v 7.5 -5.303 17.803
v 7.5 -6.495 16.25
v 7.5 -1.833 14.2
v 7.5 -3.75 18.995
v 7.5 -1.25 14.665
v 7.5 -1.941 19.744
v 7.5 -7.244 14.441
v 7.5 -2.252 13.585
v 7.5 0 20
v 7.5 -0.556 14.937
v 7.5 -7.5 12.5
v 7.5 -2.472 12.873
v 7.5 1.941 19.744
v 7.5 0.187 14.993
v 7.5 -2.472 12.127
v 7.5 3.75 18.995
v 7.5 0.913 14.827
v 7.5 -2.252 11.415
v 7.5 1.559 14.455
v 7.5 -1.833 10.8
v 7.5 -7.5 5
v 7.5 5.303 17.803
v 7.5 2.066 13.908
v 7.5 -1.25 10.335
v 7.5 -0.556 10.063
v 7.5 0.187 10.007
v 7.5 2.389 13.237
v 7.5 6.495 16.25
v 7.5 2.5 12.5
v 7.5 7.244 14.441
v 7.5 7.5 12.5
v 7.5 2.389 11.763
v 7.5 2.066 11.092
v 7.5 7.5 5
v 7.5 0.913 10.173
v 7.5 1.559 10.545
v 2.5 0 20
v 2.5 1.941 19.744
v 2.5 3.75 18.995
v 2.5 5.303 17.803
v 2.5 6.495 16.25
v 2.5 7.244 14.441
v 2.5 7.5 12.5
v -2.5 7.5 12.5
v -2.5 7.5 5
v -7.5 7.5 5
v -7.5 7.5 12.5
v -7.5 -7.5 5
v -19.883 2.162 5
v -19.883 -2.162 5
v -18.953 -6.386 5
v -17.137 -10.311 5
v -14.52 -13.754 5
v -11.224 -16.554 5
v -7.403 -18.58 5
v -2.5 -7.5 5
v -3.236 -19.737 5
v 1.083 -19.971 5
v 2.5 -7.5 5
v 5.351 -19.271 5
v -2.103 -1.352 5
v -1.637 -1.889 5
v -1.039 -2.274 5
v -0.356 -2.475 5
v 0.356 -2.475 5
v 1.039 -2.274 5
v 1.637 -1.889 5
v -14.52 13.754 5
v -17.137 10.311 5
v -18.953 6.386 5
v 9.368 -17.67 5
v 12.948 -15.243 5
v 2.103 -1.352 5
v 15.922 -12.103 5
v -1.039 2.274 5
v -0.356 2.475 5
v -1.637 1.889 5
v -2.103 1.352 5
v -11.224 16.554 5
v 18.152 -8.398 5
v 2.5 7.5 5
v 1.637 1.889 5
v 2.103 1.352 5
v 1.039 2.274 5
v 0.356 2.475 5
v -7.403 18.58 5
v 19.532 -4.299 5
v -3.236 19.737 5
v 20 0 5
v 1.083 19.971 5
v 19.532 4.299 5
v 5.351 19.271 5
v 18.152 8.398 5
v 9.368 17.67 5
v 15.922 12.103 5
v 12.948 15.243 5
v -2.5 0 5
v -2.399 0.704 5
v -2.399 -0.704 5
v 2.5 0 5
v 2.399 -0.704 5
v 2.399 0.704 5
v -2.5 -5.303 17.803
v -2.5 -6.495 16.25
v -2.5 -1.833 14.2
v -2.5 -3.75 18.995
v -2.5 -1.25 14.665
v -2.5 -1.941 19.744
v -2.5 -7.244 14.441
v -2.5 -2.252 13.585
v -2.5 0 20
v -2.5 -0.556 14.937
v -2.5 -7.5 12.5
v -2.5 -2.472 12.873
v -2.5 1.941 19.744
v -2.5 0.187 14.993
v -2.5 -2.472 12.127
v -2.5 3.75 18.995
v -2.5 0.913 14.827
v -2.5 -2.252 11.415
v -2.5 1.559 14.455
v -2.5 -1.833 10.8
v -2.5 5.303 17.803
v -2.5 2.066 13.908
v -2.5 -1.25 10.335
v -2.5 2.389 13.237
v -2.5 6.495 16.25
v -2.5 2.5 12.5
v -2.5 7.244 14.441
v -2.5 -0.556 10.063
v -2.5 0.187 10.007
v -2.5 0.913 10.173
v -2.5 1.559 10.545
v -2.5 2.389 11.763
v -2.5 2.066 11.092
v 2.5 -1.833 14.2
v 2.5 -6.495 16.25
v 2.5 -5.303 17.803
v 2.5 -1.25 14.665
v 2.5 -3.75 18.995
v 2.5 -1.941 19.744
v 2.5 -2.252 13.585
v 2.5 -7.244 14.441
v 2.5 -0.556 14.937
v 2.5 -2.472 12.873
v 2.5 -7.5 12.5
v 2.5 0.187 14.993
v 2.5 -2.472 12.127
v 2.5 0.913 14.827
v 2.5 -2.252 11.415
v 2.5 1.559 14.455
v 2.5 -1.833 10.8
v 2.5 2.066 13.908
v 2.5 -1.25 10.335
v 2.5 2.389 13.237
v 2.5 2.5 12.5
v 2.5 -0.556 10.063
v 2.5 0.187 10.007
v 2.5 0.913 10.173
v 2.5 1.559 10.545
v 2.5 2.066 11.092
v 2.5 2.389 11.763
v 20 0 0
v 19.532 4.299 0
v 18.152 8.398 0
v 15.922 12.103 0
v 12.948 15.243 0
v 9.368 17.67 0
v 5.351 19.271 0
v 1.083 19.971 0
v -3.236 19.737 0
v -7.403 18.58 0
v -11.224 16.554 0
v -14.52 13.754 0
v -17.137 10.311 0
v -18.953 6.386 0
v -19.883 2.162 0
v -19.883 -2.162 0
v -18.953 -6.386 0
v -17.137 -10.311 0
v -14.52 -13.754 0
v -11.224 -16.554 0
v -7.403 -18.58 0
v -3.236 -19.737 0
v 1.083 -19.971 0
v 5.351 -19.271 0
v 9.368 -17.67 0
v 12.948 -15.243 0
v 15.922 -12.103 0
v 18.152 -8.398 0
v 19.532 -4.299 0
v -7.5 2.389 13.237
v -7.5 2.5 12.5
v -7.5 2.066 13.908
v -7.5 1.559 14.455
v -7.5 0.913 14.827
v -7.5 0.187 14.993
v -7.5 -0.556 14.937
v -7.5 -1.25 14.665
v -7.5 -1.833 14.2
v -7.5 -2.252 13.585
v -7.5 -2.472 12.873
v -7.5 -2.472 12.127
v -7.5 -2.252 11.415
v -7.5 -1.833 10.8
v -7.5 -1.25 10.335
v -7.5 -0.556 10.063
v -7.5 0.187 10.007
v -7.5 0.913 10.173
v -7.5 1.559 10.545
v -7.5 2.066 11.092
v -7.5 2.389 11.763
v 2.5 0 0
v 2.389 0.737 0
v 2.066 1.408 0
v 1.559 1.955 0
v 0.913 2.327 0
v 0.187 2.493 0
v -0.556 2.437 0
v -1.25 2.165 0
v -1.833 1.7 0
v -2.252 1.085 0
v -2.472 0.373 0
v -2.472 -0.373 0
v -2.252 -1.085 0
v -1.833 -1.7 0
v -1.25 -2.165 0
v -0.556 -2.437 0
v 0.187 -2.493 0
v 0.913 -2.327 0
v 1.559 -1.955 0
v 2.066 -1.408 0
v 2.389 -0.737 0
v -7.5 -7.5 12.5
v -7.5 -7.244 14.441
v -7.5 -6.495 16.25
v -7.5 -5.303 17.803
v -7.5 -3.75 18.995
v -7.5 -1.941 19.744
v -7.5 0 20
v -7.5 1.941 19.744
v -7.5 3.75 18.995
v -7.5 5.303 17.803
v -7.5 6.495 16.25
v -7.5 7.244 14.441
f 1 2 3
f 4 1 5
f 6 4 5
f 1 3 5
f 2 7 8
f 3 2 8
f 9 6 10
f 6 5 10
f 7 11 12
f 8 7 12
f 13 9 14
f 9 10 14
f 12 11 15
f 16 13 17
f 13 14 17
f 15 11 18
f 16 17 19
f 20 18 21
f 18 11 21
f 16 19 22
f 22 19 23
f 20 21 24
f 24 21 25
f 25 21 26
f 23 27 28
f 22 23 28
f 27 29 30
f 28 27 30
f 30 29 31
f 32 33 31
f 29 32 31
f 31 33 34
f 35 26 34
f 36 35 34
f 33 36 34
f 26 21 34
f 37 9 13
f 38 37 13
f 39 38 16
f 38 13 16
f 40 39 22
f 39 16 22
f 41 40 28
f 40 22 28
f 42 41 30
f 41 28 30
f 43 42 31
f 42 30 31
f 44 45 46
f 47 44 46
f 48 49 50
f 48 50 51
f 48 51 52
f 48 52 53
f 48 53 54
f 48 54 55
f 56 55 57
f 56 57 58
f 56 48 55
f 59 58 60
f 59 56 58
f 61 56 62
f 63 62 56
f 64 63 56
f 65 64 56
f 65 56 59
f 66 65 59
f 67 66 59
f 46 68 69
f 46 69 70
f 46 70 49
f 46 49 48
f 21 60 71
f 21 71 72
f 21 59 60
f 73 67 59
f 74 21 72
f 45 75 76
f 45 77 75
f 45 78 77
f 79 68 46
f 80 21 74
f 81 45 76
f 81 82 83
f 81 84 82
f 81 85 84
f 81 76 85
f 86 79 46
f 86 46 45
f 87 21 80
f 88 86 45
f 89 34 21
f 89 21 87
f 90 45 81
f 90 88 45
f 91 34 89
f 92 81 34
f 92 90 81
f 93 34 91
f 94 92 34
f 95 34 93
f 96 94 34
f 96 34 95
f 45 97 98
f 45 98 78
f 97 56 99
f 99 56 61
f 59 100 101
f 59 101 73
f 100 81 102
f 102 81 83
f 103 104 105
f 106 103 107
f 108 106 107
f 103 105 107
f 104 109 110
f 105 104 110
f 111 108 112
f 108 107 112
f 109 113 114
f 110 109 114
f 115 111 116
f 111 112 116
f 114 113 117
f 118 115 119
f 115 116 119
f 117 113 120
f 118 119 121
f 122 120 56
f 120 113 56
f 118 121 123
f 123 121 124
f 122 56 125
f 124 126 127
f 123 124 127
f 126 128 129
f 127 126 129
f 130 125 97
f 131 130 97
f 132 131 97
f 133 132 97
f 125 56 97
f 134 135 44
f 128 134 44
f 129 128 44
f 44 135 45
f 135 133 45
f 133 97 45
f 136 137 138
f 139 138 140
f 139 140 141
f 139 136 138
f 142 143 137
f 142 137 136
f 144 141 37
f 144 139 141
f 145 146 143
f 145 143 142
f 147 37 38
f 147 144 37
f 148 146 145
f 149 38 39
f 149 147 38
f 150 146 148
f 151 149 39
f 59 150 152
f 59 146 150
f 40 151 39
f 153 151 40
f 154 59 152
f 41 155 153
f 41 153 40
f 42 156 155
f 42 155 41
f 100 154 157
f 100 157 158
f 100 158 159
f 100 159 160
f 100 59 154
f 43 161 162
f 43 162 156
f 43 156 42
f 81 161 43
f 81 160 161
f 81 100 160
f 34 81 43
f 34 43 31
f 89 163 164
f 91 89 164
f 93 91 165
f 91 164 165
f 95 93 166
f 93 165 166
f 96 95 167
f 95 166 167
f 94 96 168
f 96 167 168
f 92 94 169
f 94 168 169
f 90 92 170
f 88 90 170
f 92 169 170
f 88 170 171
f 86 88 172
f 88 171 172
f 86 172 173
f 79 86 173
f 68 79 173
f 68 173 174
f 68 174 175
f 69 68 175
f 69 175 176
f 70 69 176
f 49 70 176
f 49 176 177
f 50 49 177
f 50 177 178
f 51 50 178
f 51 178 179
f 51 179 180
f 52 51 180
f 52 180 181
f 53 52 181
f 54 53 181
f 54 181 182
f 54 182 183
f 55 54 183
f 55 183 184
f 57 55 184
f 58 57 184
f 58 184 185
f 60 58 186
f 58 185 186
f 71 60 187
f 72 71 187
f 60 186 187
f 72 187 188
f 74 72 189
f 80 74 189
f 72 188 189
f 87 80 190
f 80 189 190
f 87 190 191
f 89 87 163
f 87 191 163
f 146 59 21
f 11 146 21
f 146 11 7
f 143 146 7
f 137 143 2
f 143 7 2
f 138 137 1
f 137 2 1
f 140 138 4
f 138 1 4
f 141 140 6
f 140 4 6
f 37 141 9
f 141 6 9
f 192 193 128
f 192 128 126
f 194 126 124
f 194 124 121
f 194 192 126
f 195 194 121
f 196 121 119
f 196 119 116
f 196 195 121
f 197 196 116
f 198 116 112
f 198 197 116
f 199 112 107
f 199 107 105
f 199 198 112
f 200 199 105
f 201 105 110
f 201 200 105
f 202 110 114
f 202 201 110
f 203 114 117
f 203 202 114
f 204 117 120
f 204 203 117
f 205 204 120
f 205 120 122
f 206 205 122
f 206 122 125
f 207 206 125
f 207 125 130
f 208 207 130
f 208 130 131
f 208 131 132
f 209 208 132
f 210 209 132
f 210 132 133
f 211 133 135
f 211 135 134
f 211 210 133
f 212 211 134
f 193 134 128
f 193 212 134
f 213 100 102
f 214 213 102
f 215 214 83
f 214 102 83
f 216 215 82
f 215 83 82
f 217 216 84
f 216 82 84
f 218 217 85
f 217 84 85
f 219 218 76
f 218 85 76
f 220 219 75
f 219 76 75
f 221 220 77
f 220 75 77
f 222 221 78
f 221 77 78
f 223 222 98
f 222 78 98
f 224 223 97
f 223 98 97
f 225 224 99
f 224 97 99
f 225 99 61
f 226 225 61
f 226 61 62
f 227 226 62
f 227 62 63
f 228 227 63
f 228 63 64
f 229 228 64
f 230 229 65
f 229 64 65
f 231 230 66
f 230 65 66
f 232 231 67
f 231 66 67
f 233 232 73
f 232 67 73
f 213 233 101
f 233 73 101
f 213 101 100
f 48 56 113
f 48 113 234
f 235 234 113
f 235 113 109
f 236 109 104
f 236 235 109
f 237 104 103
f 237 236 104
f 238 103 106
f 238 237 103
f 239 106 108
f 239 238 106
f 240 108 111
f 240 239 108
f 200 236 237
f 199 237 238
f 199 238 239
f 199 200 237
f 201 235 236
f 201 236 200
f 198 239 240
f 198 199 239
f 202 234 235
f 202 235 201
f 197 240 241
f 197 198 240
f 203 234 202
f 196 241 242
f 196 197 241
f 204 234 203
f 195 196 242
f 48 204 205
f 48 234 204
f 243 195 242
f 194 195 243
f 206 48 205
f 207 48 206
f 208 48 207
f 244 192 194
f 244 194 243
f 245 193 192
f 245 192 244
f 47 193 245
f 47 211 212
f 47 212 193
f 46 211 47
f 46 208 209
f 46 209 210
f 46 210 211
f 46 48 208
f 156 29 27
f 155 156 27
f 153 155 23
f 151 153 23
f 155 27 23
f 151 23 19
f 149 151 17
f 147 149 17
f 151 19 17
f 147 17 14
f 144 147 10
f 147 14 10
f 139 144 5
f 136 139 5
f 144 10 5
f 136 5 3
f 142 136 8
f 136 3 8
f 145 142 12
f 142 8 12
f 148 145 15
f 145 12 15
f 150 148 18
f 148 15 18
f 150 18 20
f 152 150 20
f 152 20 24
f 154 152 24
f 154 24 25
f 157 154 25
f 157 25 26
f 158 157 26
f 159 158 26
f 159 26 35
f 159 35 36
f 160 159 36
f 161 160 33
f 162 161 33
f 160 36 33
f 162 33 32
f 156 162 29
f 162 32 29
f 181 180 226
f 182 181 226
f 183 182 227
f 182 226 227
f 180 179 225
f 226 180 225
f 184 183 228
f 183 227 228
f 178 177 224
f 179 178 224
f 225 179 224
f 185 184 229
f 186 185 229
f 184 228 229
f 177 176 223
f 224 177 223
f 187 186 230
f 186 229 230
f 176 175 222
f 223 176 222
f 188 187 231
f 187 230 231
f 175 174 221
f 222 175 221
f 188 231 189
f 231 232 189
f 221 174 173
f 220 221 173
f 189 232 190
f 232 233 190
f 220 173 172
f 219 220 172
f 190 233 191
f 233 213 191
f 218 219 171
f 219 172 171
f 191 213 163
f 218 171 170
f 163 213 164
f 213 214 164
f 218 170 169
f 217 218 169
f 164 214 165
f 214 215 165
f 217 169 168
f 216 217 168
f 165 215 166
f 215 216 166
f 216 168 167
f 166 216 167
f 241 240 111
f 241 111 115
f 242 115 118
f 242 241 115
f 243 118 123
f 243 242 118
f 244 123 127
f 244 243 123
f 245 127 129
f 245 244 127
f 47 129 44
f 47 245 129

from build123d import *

# Parameters (mm, degrees)
CROQUIS1_R              = 20
SALIENTE_EXTRUIR1_DEPTH = 5
CROQUIS2_R              = 2.5
CORTAR_EXTRUIR1_DEPTH   = 5
CROQUIS3_W              = 5
CROQUIS3_H              = 15
SALIENTE_EXTRUIR3_DEPTH = 15
CROQUIS4_R              = 2.5
CORTAR_EXTRUIR2_DEPTH   = 5


with BuildPart() as part:
    # Croquis1 → Saliente-Extruir1 (new body)
    with BuildSketch(Plane.XY):
        Circle(CROQUIS1_R)
    extrude(amount=SALIENTE_EXTRUIR1_DEPTH)

    # Croquis2 → Cortar-Extruir1 (cut)
    with BuildSketch(Plane.XY.offset(5)):
        Circle(CROQUIS2_R)
    extrude(amount=-CORTAR_EXTRUIR1_DEPTH, mode=Mode.SUBTRACT)

    # Croquis3 → Saliente-Extruir3 (add)
    with BuildSketch(Plane.XY.offset(5)):
        with Locations((5, 0)):
            Rectangle(CROQUIS3_W, CROQUIS3_H)
    extrude(amount=SALIENTE_EXTRUIR3_DEPTH)

    # Croquis4 → Cortar-Extruir2 (cut)
    with BuildSketch(Plane(origin=(7.5, 0, 0), x_dir=(0, 0, -1), z_dir=(1, 0, 0))):
        with BuildLine():
            ThreePointArc((-12.5, -7.5), (-17.803300859, -5.303300859), (-20, 0))
            Line((-20, 0), (-20, -7.5))
            Line((-20, -7.5), (-12.5, -7.5))
        make_face()
        with BuildLine():
            ThreePointArc((-20, 0), (-17.803300859, 5.303300859), (-12.5, 7.5))
            Line((-12.5, 7.5), (-20, 7.5))
            Line((-20, 7.5), (-20, 0))
        make_face()
        with Locations(Location((-12.5, 0, 0), (0, 0, 90))):
            Circle(CROQUIS4_R)
    extrude(amount=-CORTAR_EXTRUIR2_DEPTH, mode=Mode.SUBTRACT)

    # Simetría1: part across plane


with BuildPart() as part_1:
    add(part.part)
    add(part.part.mirror(Plane(origin=(0, 0, 0), x_dir=(0, 0, 1), z_dir=(1, 0, 0))))


solid = part_1.part
